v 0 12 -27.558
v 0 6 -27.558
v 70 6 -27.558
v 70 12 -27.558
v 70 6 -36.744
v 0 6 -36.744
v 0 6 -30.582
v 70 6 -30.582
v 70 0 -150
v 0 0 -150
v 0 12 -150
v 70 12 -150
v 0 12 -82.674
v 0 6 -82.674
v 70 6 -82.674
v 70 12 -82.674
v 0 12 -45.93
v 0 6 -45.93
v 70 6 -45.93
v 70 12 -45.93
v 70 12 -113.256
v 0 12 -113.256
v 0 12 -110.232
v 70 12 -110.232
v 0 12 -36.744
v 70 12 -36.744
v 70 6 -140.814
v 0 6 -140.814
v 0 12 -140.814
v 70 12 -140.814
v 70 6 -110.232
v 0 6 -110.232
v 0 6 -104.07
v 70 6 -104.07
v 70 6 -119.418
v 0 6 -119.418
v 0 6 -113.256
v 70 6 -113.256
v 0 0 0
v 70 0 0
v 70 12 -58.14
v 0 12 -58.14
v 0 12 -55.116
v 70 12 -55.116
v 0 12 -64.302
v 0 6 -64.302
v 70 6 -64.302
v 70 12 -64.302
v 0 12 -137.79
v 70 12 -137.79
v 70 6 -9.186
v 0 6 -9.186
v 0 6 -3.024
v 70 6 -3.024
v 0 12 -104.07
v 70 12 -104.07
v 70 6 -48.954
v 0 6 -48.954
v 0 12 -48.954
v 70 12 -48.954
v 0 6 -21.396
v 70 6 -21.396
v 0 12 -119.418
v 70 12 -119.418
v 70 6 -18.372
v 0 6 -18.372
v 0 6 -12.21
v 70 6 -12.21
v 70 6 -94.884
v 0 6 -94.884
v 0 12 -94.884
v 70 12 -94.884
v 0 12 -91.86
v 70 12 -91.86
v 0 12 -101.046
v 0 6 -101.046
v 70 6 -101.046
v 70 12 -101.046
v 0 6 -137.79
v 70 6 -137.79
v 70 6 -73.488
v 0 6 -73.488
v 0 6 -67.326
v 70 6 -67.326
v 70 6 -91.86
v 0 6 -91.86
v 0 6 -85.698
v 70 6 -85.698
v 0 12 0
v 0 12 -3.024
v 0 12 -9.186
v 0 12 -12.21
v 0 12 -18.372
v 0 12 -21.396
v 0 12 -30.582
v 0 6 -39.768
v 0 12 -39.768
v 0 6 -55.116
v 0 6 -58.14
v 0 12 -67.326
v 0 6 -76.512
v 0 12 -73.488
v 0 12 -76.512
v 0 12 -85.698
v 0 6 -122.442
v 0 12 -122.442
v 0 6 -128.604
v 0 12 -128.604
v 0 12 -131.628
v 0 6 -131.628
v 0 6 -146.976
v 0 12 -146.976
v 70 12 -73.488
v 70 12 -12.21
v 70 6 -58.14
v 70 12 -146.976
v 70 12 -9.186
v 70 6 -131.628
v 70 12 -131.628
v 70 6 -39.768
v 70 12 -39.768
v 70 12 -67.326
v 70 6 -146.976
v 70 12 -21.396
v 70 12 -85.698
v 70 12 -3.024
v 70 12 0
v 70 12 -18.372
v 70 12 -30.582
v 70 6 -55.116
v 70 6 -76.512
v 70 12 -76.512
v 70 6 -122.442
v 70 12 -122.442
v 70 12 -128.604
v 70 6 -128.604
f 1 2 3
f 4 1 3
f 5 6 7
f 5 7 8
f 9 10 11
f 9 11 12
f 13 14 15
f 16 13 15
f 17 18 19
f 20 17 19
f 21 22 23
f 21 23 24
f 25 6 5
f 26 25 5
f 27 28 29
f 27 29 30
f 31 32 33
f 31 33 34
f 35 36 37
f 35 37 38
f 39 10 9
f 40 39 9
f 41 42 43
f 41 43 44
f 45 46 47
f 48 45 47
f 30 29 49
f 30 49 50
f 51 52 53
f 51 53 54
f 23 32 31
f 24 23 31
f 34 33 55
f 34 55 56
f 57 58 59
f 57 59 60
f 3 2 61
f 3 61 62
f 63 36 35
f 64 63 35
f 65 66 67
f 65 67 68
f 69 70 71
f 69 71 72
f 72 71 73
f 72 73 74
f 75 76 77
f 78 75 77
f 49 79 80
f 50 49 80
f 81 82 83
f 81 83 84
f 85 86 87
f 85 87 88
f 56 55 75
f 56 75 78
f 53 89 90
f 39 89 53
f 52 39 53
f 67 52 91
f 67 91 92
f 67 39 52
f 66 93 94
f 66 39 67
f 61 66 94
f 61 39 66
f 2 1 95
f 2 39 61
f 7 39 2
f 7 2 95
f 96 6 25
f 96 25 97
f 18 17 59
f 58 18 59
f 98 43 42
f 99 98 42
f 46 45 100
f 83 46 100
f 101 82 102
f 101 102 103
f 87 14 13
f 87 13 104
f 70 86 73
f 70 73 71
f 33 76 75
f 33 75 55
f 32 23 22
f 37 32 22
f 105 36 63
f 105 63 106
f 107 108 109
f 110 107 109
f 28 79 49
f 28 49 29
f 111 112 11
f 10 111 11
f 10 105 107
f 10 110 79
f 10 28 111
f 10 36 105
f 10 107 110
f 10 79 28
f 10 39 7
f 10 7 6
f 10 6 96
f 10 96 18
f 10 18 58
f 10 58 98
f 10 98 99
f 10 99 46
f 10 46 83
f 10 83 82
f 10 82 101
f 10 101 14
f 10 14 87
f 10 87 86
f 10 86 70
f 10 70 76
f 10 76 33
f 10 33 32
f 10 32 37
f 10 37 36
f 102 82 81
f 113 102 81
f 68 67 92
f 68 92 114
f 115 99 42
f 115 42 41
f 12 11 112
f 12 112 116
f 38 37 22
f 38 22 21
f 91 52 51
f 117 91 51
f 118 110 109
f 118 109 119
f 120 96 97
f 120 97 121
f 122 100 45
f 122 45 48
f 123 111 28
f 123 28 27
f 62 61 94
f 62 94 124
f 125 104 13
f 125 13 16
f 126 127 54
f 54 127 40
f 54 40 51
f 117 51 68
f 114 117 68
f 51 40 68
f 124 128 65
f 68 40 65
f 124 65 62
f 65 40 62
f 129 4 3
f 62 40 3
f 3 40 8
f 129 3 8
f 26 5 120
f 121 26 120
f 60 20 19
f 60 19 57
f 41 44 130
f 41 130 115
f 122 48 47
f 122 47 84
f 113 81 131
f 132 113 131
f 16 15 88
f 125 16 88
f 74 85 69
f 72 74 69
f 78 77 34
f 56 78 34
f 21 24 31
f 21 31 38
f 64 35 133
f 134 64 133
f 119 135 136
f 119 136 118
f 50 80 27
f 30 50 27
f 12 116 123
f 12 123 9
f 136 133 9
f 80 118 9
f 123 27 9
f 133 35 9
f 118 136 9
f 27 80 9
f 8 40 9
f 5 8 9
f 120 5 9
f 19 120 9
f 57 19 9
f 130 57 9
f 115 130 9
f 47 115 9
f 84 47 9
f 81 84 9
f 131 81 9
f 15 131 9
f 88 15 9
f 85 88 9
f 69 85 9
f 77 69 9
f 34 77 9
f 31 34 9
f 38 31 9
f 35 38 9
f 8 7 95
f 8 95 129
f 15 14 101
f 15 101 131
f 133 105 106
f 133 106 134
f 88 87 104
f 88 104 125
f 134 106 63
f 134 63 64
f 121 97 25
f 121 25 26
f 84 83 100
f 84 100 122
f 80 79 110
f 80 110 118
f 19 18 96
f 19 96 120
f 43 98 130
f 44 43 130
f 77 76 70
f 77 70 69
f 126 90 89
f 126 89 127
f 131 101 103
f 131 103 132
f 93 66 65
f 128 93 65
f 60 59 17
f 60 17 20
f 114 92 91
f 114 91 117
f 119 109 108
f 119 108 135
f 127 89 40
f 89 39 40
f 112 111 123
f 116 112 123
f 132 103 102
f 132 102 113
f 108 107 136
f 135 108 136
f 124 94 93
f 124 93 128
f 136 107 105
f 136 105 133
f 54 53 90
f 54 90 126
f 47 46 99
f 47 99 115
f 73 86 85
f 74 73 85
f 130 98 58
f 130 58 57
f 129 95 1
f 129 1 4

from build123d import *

# Parameters (mm, degrees)
SKETCH1_W           = 70
SKETCH1_H           = 150
BOSS_EXTRUDE1_DEPTH = 6
SKETCH2_W           = 70
SKETCH2_H           = 3.0237272
BOSS_EXTRUDE2_DEPTH = 6


with BuildPart() as part:
    # Sketch1 → Boss-Extrude1 (new body)
    with BuildSketch(Plane(origin=(0, 0, 0), x_dir=(1, 0, 0), z_dir=(0, 1, 0))):
        with Locations((35, 75)):
            Rectangle(SKETCH1_W, SKETCH1_H)
    extrude(amount=BOSS_EXTRUDE1_DEPTH)

    # Sketch2 → Boss-Extrude2 (add)
    with BuildSketch(Plane(origin=(0, 6, 0), x_dir=(1, 0, 0), z_dir=(0, 1, 0))):
        with Locations((35, 1.5118636)):
            Rectangle(SKETCH2_W, SKETCH2_H)
        with Locations((35, 10.69788065)):
            Rectangle(SKETCH2_W, SKETCH2_H)
        with Locations((35, 19.8838977)):
            Rectangle(SKETCH2_W, SKETCH2_H)
        with Locations((35, 29.06991475)):
            Rectangle(SKETCH2_W, SKETCH2_H)
        with Locations((35, 38.2559318)):
            Rectangle(SKETCH2_W, SKETCH2_H)
        with Locations((35, 47.44194885)):
            Rectangle(SKETCH2_W, SKETCH2_H)
        with Locations((35, 56.6279659)):
            Rectangle(SKETCH2_W, SKETCH2_H)
        with Locations((35, 65.81398295)):
            Rectangle(SKETCH2_W, SKETCH2_H)
        with Locations((35, 75)):
            Rectangle(SKETCH2_W, SKETCH2_H)
        with Locations((35, 84.18601705)):
            Rectangle(SKETCH2_W, SKETCH2_H)
        with Locations((35, 93.3720341)):
            Rectangle(SKETCH2_W, SKETCH2_H)
        with Locations((35, 102.55805115)):
            Rectangle(SKETCH2_W, SKETCH2_H)
        with Locations((35, 111.7440682)):
            Rectangle(SKETCH2_W, SKETCH2_H)
        with Locations((35, 120.93008525)):
            Rectangle(SKETCH2_W, SKETCH2_H)
        with Locations((35, 130.1161023)):
            Rectangle(SKETCH2_W, SKETCH2_H)
        with Locations((35, 139.30211935)):
            Rectangle(SKETCH2_W, SKETCH2_H)
        with Locations((35, 148.4881364)):
            Rectangle(SKETCH2_W, SKETCH2_H)
    extrude(amount=BOSS_EXTRUDE2_DEPTH)


solid = part.part
